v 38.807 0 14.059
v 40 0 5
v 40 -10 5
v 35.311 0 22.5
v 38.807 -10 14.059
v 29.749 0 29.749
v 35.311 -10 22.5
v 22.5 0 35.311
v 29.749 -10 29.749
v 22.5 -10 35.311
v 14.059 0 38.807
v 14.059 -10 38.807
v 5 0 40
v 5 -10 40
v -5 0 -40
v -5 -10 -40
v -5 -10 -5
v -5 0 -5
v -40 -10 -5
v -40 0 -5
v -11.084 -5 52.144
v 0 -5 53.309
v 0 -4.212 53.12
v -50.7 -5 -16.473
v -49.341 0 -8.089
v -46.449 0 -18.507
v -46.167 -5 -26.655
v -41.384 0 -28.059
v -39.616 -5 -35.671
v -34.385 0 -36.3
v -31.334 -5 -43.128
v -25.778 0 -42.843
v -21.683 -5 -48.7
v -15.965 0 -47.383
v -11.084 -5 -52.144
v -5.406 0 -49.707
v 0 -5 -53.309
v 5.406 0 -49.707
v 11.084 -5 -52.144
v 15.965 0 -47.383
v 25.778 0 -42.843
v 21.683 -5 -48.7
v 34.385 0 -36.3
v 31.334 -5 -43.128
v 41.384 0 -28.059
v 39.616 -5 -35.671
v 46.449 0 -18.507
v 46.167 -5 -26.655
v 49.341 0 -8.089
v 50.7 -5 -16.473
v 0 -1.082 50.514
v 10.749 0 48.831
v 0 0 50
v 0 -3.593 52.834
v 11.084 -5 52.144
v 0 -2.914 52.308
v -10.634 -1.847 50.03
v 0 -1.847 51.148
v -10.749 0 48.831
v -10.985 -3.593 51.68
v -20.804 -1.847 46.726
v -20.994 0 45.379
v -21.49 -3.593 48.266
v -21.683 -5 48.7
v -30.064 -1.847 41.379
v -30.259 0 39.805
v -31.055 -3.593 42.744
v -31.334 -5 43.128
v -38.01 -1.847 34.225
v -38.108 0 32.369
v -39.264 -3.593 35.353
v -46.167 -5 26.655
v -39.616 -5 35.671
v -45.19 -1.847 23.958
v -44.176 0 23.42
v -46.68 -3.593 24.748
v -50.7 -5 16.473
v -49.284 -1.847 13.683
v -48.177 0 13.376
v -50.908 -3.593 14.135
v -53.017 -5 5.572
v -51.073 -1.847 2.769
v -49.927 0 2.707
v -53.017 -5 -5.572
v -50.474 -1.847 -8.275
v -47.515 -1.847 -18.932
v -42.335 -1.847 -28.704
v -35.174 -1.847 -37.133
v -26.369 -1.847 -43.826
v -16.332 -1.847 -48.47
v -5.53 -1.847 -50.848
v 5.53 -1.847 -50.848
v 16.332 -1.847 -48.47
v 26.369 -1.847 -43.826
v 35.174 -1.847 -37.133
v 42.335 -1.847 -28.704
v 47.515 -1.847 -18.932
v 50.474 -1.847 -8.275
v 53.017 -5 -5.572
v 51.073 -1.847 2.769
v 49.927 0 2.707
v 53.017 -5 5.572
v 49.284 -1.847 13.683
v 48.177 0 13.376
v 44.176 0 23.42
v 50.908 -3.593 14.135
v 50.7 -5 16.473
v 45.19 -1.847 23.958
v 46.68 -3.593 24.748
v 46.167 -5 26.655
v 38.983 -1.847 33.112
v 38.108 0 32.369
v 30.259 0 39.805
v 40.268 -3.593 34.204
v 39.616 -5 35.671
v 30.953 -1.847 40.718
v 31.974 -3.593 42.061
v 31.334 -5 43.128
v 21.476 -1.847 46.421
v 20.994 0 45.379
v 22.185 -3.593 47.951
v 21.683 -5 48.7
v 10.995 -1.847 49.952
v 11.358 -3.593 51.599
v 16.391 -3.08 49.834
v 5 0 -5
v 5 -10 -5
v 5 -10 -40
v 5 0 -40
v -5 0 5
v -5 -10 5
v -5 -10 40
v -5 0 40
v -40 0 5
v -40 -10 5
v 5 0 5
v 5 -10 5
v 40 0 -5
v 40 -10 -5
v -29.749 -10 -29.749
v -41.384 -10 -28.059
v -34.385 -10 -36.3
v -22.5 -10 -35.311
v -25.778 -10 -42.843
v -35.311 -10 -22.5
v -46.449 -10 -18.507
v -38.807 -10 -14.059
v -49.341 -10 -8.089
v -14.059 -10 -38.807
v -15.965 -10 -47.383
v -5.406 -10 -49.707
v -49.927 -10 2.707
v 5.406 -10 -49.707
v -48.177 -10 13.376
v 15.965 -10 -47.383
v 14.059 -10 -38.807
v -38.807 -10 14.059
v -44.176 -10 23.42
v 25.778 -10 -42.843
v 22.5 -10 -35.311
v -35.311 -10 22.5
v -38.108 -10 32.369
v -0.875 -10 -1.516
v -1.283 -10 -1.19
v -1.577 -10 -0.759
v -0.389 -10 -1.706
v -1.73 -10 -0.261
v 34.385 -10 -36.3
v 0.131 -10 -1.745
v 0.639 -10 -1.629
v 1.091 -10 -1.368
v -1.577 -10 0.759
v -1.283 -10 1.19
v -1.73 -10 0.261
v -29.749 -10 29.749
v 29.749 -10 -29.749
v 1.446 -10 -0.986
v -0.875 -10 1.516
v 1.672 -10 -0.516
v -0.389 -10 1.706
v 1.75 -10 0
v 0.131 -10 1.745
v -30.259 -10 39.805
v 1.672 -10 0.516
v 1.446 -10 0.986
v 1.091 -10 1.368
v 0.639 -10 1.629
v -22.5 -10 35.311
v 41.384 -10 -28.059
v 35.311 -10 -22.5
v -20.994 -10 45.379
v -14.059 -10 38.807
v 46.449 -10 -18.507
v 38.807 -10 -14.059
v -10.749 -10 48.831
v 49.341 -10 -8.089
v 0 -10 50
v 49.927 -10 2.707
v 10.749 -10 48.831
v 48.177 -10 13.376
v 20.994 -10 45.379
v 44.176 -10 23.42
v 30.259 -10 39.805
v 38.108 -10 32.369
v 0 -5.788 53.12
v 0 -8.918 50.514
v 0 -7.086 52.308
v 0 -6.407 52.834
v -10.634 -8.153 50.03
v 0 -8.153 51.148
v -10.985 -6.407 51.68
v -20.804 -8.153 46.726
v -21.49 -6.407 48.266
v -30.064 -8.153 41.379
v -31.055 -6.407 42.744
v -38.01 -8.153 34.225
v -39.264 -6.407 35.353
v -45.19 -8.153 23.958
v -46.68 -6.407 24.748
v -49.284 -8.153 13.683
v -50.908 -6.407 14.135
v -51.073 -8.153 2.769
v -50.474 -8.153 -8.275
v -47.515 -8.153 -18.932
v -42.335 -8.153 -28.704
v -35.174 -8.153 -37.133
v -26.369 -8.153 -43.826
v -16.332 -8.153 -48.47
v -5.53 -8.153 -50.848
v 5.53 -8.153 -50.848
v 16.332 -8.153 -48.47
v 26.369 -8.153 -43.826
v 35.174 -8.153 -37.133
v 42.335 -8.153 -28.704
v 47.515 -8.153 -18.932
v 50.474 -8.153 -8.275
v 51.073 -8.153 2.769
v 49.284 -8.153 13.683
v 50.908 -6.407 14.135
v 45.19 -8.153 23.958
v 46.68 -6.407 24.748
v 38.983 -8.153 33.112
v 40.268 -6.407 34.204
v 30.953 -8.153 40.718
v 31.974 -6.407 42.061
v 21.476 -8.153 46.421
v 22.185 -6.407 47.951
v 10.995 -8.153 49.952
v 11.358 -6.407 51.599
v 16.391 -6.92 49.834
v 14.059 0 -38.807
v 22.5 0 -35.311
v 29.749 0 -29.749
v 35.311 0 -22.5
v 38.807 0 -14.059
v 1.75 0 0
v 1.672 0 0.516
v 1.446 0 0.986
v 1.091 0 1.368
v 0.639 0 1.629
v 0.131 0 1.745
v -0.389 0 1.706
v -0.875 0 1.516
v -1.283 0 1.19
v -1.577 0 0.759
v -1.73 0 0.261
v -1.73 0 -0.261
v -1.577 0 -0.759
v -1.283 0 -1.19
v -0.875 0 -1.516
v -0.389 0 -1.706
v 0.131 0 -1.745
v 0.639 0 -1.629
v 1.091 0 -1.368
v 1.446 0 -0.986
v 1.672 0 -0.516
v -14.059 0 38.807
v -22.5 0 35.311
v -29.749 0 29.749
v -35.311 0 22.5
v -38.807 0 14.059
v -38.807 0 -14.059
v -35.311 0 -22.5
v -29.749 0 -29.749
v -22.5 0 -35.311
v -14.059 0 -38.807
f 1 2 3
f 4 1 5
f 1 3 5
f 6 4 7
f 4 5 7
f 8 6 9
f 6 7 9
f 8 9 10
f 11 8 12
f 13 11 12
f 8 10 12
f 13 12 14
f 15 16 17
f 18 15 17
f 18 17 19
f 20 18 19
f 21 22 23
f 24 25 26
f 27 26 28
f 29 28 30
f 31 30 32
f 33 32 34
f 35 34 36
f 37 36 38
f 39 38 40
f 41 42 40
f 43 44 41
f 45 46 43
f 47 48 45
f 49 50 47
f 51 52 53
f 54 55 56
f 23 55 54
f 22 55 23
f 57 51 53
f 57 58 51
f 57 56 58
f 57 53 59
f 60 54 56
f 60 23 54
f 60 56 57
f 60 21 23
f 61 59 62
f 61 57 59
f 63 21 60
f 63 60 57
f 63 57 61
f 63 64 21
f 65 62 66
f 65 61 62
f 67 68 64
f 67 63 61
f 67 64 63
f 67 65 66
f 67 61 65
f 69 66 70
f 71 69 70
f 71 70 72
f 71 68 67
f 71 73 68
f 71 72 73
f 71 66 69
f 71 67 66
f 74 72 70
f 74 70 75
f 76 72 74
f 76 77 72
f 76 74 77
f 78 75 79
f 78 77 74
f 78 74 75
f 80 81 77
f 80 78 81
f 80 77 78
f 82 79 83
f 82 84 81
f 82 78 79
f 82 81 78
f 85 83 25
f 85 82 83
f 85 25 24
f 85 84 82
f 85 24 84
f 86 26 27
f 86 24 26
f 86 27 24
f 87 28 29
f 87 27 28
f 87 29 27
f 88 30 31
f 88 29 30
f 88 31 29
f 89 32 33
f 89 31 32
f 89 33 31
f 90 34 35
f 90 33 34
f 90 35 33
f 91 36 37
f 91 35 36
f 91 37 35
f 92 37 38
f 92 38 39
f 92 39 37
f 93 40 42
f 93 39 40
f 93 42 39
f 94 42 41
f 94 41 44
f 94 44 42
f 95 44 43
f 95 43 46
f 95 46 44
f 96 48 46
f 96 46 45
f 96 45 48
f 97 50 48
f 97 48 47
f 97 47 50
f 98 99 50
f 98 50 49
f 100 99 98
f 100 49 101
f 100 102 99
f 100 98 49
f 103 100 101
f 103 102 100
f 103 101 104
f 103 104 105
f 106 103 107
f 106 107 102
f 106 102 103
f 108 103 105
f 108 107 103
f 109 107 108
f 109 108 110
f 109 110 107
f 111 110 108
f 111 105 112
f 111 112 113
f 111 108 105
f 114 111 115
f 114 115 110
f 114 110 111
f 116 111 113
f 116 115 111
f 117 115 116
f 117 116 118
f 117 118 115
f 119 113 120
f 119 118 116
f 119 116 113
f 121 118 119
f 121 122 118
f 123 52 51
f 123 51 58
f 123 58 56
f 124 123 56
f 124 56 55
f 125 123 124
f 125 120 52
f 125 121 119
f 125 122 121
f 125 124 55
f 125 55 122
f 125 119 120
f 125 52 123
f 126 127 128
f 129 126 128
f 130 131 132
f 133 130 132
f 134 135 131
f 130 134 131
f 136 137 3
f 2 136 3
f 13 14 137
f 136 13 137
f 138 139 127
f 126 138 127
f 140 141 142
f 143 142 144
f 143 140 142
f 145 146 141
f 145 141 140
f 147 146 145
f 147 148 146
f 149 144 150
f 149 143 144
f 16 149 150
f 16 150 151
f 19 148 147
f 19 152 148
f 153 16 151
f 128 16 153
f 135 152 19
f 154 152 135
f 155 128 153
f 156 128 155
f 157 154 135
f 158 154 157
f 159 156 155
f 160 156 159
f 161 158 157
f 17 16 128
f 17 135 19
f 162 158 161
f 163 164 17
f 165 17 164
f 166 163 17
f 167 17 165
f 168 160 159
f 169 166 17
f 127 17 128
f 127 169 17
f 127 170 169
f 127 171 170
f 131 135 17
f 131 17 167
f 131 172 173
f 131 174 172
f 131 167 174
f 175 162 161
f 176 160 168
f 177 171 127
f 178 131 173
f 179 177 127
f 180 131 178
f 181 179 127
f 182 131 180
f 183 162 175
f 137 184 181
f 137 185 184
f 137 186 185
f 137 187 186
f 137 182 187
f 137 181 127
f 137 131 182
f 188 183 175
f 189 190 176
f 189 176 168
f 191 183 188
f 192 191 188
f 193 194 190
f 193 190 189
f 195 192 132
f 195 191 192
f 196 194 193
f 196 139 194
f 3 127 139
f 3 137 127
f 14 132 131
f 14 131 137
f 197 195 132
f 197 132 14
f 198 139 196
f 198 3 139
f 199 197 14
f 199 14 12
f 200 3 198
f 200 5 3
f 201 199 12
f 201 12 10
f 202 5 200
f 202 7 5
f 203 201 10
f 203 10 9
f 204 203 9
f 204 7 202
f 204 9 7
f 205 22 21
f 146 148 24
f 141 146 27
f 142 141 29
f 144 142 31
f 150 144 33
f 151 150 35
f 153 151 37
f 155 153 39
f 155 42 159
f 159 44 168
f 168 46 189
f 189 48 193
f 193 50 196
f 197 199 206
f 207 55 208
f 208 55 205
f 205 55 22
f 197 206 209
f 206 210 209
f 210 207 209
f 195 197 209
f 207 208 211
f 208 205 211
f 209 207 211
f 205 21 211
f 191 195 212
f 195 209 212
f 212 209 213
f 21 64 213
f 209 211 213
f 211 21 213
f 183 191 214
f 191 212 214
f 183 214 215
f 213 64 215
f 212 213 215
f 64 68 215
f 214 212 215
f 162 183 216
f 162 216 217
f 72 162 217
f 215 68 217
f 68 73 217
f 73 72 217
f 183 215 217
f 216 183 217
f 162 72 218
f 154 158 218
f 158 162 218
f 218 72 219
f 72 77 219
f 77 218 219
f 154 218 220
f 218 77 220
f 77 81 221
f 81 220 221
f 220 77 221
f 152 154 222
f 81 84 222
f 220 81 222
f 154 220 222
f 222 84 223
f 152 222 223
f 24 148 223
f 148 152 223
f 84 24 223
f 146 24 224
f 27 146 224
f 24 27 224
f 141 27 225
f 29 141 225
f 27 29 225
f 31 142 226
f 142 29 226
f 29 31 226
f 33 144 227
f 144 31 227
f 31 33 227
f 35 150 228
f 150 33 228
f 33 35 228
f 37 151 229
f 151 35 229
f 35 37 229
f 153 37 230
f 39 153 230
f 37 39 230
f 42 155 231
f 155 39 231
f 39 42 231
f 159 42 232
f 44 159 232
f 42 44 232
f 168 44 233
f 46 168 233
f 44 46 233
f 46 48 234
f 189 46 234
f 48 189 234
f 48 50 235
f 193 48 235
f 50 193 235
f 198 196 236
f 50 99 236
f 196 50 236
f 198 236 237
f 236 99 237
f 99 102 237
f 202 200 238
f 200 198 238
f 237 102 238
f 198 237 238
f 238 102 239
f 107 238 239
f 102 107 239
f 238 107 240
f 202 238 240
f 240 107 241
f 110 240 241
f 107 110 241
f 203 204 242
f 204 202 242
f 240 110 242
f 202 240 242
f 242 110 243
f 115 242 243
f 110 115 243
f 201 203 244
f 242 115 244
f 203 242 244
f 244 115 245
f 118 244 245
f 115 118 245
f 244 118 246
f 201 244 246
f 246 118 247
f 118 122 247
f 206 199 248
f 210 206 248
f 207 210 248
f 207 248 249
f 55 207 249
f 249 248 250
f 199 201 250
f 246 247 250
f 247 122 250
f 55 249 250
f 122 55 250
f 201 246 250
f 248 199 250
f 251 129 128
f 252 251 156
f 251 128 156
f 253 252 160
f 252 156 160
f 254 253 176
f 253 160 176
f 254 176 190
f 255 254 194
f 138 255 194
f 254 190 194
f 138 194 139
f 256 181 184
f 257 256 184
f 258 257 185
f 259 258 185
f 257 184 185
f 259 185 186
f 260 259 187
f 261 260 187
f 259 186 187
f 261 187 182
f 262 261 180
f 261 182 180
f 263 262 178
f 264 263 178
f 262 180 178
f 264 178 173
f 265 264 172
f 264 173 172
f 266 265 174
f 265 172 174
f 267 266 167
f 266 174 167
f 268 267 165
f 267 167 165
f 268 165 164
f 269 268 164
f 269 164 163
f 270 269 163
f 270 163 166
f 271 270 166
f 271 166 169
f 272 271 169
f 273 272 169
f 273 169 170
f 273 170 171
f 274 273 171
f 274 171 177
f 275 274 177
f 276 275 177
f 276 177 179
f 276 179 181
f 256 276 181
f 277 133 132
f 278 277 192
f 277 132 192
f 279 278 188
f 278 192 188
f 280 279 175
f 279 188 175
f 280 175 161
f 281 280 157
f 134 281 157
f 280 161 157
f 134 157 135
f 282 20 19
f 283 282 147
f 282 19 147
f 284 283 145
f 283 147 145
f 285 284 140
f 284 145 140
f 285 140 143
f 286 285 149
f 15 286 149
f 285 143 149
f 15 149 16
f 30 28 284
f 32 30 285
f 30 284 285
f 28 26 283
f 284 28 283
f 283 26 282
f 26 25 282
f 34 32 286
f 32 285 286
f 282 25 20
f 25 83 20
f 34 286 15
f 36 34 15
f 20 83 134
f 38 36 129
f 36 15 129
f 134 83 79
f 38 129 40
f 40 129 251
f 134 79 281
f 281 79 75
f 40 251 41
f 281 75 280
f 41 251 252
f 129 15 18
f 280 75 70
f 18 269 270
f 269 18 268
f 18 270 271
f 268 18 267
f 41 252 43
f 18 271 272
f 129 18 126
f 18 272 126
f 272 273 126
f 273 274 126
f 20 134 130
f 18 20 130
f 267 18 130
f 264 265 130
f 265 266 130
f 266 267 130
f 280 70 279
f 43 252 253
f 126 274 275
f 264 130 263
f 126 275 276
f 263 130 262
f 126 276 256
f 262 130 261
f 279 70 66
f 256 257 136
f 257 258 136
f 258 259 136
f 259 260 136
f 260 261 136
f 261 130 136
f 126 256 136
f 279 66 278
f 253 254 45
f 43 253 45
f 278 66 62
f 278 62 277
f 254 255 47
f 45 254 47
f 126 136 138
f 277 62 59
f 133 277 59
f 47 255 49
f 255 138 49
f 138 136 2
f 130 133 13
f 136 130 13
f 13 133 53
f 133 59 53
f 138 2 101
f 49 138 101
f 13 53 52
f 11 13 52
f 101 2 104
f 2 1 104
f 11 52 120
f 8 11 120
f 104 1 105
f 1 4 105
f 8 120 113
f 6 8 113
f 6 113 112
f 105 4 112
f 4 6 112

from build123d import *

# Parameters (mm, degrees)
F0_R     = 50
F1_DEPTH = 10
F5_R     = 1.75
F6_DEPTH = 10.001
F8_DEPTH = 10.001


with BuildPart() as f1:
    # F0 (on Front) → F1 (new body)
    with BuildSketch(Plane.XZ):
        Circle(F0_R)
    extrude(amount=F1_DEPTH)

    # F3 (on Right) → F4 (revolve)
    with BuildSketch(Plane.YZ):
        with BuildLine():
            Line((-10, 50), (0, 50))
            add(Edge.make_bspline(
                [(0, 50), (-2.587933, 50.855839), (-2.303226, 52.902121), (-5, 53.30912)],
                knots=[0, 0, 0, 0, 5.995855, 5.995855, 5.995855, 5.995855], degree=3))
            add(Edge.make_bspline(
                [(-10, 50), (-7.412067, 50.855839), (-7.696774, 52.902121), (-5, 53.30912)],
                knots=[0, 0, 0, 0, 5.995855, 5.995855, 5.995855, 5.995855], degree=3))
        make_face()
    revolve(axis=Axis((0, -20.942401, 0), (0, -1, 0)))

    # F5 (on face) → F6 (cut, through all)
    with BuildSketch(Plane.XZ.offset(10)):
        Circle(F5_R)
    extrude(amount=-F6_DEPTH, mode=Mode.SUBTRACT)

    # F7 (on face) → F8 (cut, through all)
    with BuildSketch(Plane.XZ.offset(10)):
        with BuildLine():
            Line((-40, 5), (-5, 5))
            Line((-5, 5), (-5, 40))
            ThreePointArc((-5, 40), (-29.748737, 29.748737), (-40, 5))
        make_face()
        with BuildLine():
            ThreePointArc((40, 5), (29.748737, 29.748737), (5, 40))
            Line((5, 40), (5, 5))
            Line((5, 5), (40, 5))
        make_face()
        with BuildLine():
            Line((40, -5), (5, -5))
            Line((5, -5), (5, -40))
            ThreePointArc((5, -40), (29.748737, -29.748737), (40, -5))
        make_face()
        with BuildLine():
            Line((-5, -40), (-5, -5))
            Line((-5, -5), (-40, -5))
            ThreePointArc((-40, -5), (-29.748737, -29.748737), (-5, -40))
        make_face()
    extrude(amount=-F8_DEPTH, mode=Mode.SUBTRACT)


solid = f1.part
